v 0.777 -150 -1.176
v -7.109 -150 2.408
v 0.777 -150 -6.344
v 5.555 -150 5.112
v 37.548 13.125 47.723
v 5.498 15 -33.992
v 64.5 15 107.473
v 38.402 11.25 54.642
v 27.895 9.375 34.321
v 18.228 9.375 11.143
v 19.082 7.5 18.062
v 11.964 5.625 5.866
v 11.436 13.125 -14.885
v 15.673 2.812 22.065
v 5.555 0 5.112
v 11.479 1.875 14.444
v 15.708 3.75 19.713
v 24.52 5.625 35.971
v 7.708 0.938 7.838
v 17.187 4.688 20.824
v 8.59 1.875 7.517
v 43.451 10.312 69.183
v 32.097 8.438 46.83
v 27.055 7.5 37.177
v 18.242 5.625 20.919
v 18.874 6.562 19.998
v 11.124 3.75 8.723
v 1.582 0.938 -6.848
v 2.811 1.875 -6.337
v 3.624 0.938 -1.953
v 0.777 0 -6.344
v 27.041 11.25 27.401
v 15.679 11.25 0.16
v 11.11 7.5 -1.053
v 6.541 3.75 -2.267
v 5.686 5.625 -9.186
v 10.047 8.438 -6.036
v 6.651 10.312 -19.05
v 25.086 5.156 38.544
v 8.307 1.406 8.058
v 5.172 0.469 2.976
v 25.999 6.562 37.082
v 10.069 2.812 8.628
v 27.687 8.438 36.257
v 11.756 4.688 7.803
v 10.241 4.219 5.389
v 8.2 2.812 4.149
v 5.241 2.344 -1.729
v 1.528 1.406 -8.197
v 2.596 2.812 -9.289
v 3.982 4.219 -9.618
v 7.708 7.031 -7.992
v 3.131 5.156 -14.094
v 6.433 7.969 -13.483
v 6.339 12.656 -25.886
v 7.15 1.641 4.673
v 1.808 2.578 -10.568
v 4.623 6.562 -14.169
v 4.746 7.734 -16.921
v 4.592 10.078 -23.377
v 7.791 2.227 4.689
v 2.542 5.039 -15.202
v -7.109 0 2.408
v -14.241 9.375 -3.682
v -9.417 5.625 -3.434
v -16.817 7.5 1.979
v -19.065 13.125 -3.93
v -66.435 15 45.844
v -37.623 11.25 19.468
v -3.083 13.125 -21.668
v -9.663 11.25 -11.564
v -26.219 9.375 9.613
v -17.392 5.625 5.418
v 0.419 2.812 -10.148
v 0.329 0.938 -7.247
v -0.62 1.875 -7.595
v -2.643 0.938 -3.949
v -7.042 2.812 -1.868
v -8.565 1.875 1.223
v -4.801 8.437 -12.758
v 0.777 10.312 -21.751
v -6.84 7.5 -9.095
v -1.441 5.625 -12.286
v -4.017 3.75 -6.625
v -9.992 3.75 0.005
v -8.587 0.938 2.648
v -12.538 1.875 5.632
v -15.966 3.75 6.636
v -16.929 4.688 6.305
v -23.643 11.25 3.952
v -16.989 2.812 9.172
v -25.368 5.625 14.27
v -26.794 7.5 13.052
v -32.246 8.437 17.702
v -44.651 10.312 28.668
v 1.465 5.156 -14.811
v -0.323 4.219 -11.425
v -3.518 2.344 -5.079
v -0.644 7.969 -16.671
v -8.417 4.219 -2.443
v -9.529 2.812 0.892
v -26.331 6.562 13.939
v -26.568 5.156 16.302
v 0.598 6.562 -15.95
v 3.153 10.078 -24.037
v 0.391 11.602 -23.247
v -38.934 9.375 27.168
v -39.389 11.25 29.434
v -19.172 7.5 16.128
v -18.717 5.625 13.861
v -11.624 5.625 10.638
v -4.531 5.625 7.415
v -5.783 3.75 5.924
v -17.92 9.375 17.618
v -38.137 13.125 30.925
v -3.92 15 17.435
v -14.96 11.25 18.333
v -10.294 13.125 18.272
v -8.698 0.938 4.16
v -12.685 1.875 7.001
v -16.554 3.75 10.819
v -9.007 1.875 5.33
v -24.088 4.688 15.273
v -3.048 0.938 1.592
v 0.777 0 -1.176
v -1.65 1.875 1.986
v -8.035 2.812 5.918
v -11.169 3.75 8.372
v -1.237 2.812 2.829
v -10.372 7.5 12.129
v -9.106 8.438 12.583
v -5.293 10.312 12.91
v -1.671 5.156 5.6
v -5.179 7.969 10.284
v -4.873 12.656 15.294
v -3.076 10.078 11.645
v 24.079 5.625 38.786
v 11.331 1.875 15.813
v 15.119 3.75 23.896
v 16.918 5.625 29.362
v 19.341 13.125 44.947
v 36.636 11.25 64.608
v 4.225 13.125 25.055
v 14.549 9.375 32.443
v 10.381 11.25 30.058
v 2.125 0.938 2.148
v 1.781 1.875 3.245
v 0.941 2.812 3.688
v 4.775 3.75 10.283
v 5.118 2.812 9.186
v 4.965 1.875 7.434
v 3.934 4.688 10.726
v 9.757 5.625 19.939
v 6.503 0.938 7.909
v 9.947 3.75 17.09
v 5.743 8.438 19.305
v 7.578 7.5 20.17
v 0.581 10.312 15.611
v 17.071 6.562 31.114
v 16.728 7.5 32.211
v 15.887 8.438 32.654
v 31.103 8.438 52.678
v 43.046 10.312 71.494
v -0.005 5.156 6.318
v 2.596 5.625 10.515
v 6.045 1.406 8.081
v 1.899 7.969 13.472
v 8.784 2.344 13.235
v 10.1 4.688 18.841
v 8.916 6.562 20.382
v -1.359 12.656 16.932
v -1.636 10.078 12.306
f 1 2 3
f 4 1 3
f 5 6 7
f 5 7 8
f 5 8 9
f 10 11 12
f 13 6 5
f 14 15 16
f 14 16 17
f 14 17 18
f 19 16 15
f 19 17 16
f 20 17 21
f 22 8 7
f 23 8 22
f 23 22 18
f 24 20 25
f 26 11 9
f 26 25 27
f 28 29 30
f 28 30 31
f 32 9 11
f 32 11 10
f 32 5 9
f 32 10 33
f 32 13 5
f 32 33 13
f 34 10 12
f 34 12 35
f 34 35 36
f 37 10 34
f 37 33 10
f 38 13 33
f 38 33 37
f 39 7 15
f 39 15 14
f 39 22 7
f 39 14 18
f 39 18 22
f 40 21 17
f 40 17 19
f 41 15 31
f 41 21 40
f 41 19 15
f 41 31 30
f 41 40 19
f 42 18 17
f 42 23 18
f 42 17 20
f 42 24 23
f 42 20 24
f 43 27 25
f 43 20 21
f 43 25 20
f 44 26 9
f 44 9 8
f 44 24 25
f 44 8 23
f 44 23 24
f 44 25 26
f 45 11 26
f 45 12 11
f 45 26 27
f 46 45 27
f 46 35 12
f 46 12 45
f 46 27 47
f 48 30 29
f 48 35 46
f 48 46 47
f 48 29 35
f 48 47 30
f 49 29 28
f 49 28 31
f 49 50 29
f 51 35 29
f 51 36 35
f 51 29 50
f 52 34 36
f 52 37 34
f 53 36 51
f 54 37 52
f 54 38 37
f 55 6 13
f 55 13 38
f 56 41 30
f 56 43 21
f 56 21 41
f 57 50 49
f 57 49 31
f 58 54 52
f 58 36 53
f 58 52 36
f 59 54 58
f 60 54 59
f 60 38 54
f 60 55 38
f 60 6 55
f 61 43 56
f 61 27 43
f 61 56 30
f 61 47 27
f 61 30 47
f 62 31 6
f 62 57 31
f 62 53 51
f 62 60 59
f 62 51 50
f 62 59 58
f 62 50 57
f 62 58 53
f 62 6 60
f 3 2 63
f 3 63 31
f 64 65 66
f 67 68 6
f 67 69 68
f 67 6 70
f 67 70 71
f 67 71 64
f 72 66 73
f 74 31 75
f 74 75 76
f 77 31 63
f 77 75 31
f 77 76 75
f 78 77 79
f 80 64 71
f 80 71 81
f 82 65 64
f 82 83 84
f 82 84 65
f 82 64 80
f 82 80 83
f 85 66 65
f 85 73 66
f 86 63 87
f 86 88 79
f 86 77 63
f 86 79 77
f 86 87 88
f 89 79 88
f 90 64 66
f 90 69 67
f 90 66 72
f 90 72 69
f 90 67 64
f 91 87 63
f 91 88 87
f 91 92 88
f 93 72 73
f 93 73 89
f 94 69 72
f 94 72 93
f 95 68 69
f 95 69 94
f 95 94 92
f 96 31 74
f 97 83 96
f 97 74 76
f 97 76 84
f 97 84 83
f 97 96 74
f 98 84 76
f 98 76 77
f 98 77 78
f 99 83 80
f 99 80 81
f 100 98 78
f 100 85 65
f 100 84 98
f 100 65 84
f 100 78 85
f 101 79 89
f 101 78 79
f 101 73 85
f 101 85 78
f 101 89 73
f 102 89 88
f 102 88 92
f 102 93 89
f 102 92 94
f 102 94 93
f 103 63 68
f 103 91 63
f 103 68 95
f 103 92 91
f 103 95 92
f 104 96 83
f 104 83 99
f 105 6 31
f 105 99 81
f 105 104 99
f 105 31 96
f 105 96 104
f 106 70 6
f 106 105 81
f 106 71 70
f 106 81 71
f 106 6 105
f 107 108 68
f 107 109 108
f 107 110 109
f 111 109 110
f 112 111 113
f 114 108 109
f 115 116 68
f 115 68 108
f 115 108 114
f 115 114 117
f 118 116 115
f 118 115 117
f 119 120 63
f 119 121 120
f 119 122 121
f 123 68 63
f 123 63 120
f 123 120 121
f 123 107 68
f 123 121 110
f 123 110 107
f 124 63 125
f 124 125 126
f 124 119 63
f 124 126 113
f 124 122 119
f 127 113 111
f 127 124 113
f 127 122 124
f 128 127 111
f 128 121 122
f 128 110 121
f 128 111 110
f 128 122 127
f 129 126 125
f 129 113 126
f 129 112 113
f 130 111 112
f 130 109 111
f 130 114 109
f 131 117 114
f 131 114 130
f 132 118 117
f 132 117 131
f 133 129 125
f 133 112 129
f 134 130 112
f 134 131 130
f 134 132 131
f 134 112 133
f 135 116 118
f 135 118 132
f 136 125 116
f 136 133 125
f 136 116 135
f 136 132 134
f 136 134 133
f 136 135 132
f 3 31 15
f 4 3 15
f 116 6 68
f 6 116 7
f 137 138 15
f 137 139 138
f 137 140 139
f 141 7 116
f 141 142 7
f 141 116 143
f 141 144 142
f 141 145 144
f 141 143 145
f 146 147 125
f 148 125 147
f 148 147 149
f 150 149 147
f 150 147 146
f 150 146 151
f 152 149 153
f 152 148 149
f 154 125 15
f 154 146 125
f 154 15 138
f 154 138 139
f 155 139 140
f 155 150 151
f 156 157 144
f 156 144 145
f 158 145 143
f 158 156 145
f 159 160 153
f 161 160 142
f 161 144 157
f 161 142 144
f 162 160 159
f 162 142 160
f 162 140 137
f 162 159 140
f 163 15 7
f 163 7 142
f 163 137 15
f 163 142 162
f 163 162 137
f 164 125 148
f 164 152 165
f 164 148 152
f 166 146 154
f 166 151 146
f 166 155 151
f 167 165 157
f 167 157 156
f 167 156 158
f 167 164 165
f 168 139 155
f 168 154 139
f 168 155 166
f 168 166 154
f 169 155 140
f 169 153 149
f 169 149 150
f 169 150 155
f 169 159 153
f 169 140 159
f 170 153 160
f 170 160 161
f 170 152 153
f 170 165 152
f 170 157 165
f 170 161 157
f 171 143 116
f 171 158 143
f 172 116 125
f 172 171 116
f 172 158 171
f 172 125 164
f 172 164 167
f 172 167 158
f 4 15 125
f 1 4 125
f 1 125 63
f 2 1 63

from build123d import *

# Parameters (mm, degrees)
F1_DEPTH = 150
F2_DEPTH = 15
F2_TAPER = -45


with BuildPart() as f1:
    # F0 (on Front) → F1 (new body)
    with BuildSketch(Plane.XZ):
        Polygon((5.5549415993, 5.1121377619), (0.7767878706, -1.1757001048), (-7.1085173404, 2.4076352129), (0.7767878706, -6.34407287), align=None)
    extrude(amount=F1_DEPTH)

    # F1_face (on face) → F2 (join)
    with BuildSketch(Plane(origin=(-0.2589292902, 0, -1.3638932288), x_dir=(1, 0, 0), z_dir=(0, 1, 0))):
        Polygon((1.0357171608, 4.9801796412), (-6.8495880502, -3.7715284417), (1.0357171608, -0.188193124), (5.8138708894, -6.4760309907), align=None)
    extrude(amount=F2_DEPTH, taper=F2_TAPER)


solid = f1.part
